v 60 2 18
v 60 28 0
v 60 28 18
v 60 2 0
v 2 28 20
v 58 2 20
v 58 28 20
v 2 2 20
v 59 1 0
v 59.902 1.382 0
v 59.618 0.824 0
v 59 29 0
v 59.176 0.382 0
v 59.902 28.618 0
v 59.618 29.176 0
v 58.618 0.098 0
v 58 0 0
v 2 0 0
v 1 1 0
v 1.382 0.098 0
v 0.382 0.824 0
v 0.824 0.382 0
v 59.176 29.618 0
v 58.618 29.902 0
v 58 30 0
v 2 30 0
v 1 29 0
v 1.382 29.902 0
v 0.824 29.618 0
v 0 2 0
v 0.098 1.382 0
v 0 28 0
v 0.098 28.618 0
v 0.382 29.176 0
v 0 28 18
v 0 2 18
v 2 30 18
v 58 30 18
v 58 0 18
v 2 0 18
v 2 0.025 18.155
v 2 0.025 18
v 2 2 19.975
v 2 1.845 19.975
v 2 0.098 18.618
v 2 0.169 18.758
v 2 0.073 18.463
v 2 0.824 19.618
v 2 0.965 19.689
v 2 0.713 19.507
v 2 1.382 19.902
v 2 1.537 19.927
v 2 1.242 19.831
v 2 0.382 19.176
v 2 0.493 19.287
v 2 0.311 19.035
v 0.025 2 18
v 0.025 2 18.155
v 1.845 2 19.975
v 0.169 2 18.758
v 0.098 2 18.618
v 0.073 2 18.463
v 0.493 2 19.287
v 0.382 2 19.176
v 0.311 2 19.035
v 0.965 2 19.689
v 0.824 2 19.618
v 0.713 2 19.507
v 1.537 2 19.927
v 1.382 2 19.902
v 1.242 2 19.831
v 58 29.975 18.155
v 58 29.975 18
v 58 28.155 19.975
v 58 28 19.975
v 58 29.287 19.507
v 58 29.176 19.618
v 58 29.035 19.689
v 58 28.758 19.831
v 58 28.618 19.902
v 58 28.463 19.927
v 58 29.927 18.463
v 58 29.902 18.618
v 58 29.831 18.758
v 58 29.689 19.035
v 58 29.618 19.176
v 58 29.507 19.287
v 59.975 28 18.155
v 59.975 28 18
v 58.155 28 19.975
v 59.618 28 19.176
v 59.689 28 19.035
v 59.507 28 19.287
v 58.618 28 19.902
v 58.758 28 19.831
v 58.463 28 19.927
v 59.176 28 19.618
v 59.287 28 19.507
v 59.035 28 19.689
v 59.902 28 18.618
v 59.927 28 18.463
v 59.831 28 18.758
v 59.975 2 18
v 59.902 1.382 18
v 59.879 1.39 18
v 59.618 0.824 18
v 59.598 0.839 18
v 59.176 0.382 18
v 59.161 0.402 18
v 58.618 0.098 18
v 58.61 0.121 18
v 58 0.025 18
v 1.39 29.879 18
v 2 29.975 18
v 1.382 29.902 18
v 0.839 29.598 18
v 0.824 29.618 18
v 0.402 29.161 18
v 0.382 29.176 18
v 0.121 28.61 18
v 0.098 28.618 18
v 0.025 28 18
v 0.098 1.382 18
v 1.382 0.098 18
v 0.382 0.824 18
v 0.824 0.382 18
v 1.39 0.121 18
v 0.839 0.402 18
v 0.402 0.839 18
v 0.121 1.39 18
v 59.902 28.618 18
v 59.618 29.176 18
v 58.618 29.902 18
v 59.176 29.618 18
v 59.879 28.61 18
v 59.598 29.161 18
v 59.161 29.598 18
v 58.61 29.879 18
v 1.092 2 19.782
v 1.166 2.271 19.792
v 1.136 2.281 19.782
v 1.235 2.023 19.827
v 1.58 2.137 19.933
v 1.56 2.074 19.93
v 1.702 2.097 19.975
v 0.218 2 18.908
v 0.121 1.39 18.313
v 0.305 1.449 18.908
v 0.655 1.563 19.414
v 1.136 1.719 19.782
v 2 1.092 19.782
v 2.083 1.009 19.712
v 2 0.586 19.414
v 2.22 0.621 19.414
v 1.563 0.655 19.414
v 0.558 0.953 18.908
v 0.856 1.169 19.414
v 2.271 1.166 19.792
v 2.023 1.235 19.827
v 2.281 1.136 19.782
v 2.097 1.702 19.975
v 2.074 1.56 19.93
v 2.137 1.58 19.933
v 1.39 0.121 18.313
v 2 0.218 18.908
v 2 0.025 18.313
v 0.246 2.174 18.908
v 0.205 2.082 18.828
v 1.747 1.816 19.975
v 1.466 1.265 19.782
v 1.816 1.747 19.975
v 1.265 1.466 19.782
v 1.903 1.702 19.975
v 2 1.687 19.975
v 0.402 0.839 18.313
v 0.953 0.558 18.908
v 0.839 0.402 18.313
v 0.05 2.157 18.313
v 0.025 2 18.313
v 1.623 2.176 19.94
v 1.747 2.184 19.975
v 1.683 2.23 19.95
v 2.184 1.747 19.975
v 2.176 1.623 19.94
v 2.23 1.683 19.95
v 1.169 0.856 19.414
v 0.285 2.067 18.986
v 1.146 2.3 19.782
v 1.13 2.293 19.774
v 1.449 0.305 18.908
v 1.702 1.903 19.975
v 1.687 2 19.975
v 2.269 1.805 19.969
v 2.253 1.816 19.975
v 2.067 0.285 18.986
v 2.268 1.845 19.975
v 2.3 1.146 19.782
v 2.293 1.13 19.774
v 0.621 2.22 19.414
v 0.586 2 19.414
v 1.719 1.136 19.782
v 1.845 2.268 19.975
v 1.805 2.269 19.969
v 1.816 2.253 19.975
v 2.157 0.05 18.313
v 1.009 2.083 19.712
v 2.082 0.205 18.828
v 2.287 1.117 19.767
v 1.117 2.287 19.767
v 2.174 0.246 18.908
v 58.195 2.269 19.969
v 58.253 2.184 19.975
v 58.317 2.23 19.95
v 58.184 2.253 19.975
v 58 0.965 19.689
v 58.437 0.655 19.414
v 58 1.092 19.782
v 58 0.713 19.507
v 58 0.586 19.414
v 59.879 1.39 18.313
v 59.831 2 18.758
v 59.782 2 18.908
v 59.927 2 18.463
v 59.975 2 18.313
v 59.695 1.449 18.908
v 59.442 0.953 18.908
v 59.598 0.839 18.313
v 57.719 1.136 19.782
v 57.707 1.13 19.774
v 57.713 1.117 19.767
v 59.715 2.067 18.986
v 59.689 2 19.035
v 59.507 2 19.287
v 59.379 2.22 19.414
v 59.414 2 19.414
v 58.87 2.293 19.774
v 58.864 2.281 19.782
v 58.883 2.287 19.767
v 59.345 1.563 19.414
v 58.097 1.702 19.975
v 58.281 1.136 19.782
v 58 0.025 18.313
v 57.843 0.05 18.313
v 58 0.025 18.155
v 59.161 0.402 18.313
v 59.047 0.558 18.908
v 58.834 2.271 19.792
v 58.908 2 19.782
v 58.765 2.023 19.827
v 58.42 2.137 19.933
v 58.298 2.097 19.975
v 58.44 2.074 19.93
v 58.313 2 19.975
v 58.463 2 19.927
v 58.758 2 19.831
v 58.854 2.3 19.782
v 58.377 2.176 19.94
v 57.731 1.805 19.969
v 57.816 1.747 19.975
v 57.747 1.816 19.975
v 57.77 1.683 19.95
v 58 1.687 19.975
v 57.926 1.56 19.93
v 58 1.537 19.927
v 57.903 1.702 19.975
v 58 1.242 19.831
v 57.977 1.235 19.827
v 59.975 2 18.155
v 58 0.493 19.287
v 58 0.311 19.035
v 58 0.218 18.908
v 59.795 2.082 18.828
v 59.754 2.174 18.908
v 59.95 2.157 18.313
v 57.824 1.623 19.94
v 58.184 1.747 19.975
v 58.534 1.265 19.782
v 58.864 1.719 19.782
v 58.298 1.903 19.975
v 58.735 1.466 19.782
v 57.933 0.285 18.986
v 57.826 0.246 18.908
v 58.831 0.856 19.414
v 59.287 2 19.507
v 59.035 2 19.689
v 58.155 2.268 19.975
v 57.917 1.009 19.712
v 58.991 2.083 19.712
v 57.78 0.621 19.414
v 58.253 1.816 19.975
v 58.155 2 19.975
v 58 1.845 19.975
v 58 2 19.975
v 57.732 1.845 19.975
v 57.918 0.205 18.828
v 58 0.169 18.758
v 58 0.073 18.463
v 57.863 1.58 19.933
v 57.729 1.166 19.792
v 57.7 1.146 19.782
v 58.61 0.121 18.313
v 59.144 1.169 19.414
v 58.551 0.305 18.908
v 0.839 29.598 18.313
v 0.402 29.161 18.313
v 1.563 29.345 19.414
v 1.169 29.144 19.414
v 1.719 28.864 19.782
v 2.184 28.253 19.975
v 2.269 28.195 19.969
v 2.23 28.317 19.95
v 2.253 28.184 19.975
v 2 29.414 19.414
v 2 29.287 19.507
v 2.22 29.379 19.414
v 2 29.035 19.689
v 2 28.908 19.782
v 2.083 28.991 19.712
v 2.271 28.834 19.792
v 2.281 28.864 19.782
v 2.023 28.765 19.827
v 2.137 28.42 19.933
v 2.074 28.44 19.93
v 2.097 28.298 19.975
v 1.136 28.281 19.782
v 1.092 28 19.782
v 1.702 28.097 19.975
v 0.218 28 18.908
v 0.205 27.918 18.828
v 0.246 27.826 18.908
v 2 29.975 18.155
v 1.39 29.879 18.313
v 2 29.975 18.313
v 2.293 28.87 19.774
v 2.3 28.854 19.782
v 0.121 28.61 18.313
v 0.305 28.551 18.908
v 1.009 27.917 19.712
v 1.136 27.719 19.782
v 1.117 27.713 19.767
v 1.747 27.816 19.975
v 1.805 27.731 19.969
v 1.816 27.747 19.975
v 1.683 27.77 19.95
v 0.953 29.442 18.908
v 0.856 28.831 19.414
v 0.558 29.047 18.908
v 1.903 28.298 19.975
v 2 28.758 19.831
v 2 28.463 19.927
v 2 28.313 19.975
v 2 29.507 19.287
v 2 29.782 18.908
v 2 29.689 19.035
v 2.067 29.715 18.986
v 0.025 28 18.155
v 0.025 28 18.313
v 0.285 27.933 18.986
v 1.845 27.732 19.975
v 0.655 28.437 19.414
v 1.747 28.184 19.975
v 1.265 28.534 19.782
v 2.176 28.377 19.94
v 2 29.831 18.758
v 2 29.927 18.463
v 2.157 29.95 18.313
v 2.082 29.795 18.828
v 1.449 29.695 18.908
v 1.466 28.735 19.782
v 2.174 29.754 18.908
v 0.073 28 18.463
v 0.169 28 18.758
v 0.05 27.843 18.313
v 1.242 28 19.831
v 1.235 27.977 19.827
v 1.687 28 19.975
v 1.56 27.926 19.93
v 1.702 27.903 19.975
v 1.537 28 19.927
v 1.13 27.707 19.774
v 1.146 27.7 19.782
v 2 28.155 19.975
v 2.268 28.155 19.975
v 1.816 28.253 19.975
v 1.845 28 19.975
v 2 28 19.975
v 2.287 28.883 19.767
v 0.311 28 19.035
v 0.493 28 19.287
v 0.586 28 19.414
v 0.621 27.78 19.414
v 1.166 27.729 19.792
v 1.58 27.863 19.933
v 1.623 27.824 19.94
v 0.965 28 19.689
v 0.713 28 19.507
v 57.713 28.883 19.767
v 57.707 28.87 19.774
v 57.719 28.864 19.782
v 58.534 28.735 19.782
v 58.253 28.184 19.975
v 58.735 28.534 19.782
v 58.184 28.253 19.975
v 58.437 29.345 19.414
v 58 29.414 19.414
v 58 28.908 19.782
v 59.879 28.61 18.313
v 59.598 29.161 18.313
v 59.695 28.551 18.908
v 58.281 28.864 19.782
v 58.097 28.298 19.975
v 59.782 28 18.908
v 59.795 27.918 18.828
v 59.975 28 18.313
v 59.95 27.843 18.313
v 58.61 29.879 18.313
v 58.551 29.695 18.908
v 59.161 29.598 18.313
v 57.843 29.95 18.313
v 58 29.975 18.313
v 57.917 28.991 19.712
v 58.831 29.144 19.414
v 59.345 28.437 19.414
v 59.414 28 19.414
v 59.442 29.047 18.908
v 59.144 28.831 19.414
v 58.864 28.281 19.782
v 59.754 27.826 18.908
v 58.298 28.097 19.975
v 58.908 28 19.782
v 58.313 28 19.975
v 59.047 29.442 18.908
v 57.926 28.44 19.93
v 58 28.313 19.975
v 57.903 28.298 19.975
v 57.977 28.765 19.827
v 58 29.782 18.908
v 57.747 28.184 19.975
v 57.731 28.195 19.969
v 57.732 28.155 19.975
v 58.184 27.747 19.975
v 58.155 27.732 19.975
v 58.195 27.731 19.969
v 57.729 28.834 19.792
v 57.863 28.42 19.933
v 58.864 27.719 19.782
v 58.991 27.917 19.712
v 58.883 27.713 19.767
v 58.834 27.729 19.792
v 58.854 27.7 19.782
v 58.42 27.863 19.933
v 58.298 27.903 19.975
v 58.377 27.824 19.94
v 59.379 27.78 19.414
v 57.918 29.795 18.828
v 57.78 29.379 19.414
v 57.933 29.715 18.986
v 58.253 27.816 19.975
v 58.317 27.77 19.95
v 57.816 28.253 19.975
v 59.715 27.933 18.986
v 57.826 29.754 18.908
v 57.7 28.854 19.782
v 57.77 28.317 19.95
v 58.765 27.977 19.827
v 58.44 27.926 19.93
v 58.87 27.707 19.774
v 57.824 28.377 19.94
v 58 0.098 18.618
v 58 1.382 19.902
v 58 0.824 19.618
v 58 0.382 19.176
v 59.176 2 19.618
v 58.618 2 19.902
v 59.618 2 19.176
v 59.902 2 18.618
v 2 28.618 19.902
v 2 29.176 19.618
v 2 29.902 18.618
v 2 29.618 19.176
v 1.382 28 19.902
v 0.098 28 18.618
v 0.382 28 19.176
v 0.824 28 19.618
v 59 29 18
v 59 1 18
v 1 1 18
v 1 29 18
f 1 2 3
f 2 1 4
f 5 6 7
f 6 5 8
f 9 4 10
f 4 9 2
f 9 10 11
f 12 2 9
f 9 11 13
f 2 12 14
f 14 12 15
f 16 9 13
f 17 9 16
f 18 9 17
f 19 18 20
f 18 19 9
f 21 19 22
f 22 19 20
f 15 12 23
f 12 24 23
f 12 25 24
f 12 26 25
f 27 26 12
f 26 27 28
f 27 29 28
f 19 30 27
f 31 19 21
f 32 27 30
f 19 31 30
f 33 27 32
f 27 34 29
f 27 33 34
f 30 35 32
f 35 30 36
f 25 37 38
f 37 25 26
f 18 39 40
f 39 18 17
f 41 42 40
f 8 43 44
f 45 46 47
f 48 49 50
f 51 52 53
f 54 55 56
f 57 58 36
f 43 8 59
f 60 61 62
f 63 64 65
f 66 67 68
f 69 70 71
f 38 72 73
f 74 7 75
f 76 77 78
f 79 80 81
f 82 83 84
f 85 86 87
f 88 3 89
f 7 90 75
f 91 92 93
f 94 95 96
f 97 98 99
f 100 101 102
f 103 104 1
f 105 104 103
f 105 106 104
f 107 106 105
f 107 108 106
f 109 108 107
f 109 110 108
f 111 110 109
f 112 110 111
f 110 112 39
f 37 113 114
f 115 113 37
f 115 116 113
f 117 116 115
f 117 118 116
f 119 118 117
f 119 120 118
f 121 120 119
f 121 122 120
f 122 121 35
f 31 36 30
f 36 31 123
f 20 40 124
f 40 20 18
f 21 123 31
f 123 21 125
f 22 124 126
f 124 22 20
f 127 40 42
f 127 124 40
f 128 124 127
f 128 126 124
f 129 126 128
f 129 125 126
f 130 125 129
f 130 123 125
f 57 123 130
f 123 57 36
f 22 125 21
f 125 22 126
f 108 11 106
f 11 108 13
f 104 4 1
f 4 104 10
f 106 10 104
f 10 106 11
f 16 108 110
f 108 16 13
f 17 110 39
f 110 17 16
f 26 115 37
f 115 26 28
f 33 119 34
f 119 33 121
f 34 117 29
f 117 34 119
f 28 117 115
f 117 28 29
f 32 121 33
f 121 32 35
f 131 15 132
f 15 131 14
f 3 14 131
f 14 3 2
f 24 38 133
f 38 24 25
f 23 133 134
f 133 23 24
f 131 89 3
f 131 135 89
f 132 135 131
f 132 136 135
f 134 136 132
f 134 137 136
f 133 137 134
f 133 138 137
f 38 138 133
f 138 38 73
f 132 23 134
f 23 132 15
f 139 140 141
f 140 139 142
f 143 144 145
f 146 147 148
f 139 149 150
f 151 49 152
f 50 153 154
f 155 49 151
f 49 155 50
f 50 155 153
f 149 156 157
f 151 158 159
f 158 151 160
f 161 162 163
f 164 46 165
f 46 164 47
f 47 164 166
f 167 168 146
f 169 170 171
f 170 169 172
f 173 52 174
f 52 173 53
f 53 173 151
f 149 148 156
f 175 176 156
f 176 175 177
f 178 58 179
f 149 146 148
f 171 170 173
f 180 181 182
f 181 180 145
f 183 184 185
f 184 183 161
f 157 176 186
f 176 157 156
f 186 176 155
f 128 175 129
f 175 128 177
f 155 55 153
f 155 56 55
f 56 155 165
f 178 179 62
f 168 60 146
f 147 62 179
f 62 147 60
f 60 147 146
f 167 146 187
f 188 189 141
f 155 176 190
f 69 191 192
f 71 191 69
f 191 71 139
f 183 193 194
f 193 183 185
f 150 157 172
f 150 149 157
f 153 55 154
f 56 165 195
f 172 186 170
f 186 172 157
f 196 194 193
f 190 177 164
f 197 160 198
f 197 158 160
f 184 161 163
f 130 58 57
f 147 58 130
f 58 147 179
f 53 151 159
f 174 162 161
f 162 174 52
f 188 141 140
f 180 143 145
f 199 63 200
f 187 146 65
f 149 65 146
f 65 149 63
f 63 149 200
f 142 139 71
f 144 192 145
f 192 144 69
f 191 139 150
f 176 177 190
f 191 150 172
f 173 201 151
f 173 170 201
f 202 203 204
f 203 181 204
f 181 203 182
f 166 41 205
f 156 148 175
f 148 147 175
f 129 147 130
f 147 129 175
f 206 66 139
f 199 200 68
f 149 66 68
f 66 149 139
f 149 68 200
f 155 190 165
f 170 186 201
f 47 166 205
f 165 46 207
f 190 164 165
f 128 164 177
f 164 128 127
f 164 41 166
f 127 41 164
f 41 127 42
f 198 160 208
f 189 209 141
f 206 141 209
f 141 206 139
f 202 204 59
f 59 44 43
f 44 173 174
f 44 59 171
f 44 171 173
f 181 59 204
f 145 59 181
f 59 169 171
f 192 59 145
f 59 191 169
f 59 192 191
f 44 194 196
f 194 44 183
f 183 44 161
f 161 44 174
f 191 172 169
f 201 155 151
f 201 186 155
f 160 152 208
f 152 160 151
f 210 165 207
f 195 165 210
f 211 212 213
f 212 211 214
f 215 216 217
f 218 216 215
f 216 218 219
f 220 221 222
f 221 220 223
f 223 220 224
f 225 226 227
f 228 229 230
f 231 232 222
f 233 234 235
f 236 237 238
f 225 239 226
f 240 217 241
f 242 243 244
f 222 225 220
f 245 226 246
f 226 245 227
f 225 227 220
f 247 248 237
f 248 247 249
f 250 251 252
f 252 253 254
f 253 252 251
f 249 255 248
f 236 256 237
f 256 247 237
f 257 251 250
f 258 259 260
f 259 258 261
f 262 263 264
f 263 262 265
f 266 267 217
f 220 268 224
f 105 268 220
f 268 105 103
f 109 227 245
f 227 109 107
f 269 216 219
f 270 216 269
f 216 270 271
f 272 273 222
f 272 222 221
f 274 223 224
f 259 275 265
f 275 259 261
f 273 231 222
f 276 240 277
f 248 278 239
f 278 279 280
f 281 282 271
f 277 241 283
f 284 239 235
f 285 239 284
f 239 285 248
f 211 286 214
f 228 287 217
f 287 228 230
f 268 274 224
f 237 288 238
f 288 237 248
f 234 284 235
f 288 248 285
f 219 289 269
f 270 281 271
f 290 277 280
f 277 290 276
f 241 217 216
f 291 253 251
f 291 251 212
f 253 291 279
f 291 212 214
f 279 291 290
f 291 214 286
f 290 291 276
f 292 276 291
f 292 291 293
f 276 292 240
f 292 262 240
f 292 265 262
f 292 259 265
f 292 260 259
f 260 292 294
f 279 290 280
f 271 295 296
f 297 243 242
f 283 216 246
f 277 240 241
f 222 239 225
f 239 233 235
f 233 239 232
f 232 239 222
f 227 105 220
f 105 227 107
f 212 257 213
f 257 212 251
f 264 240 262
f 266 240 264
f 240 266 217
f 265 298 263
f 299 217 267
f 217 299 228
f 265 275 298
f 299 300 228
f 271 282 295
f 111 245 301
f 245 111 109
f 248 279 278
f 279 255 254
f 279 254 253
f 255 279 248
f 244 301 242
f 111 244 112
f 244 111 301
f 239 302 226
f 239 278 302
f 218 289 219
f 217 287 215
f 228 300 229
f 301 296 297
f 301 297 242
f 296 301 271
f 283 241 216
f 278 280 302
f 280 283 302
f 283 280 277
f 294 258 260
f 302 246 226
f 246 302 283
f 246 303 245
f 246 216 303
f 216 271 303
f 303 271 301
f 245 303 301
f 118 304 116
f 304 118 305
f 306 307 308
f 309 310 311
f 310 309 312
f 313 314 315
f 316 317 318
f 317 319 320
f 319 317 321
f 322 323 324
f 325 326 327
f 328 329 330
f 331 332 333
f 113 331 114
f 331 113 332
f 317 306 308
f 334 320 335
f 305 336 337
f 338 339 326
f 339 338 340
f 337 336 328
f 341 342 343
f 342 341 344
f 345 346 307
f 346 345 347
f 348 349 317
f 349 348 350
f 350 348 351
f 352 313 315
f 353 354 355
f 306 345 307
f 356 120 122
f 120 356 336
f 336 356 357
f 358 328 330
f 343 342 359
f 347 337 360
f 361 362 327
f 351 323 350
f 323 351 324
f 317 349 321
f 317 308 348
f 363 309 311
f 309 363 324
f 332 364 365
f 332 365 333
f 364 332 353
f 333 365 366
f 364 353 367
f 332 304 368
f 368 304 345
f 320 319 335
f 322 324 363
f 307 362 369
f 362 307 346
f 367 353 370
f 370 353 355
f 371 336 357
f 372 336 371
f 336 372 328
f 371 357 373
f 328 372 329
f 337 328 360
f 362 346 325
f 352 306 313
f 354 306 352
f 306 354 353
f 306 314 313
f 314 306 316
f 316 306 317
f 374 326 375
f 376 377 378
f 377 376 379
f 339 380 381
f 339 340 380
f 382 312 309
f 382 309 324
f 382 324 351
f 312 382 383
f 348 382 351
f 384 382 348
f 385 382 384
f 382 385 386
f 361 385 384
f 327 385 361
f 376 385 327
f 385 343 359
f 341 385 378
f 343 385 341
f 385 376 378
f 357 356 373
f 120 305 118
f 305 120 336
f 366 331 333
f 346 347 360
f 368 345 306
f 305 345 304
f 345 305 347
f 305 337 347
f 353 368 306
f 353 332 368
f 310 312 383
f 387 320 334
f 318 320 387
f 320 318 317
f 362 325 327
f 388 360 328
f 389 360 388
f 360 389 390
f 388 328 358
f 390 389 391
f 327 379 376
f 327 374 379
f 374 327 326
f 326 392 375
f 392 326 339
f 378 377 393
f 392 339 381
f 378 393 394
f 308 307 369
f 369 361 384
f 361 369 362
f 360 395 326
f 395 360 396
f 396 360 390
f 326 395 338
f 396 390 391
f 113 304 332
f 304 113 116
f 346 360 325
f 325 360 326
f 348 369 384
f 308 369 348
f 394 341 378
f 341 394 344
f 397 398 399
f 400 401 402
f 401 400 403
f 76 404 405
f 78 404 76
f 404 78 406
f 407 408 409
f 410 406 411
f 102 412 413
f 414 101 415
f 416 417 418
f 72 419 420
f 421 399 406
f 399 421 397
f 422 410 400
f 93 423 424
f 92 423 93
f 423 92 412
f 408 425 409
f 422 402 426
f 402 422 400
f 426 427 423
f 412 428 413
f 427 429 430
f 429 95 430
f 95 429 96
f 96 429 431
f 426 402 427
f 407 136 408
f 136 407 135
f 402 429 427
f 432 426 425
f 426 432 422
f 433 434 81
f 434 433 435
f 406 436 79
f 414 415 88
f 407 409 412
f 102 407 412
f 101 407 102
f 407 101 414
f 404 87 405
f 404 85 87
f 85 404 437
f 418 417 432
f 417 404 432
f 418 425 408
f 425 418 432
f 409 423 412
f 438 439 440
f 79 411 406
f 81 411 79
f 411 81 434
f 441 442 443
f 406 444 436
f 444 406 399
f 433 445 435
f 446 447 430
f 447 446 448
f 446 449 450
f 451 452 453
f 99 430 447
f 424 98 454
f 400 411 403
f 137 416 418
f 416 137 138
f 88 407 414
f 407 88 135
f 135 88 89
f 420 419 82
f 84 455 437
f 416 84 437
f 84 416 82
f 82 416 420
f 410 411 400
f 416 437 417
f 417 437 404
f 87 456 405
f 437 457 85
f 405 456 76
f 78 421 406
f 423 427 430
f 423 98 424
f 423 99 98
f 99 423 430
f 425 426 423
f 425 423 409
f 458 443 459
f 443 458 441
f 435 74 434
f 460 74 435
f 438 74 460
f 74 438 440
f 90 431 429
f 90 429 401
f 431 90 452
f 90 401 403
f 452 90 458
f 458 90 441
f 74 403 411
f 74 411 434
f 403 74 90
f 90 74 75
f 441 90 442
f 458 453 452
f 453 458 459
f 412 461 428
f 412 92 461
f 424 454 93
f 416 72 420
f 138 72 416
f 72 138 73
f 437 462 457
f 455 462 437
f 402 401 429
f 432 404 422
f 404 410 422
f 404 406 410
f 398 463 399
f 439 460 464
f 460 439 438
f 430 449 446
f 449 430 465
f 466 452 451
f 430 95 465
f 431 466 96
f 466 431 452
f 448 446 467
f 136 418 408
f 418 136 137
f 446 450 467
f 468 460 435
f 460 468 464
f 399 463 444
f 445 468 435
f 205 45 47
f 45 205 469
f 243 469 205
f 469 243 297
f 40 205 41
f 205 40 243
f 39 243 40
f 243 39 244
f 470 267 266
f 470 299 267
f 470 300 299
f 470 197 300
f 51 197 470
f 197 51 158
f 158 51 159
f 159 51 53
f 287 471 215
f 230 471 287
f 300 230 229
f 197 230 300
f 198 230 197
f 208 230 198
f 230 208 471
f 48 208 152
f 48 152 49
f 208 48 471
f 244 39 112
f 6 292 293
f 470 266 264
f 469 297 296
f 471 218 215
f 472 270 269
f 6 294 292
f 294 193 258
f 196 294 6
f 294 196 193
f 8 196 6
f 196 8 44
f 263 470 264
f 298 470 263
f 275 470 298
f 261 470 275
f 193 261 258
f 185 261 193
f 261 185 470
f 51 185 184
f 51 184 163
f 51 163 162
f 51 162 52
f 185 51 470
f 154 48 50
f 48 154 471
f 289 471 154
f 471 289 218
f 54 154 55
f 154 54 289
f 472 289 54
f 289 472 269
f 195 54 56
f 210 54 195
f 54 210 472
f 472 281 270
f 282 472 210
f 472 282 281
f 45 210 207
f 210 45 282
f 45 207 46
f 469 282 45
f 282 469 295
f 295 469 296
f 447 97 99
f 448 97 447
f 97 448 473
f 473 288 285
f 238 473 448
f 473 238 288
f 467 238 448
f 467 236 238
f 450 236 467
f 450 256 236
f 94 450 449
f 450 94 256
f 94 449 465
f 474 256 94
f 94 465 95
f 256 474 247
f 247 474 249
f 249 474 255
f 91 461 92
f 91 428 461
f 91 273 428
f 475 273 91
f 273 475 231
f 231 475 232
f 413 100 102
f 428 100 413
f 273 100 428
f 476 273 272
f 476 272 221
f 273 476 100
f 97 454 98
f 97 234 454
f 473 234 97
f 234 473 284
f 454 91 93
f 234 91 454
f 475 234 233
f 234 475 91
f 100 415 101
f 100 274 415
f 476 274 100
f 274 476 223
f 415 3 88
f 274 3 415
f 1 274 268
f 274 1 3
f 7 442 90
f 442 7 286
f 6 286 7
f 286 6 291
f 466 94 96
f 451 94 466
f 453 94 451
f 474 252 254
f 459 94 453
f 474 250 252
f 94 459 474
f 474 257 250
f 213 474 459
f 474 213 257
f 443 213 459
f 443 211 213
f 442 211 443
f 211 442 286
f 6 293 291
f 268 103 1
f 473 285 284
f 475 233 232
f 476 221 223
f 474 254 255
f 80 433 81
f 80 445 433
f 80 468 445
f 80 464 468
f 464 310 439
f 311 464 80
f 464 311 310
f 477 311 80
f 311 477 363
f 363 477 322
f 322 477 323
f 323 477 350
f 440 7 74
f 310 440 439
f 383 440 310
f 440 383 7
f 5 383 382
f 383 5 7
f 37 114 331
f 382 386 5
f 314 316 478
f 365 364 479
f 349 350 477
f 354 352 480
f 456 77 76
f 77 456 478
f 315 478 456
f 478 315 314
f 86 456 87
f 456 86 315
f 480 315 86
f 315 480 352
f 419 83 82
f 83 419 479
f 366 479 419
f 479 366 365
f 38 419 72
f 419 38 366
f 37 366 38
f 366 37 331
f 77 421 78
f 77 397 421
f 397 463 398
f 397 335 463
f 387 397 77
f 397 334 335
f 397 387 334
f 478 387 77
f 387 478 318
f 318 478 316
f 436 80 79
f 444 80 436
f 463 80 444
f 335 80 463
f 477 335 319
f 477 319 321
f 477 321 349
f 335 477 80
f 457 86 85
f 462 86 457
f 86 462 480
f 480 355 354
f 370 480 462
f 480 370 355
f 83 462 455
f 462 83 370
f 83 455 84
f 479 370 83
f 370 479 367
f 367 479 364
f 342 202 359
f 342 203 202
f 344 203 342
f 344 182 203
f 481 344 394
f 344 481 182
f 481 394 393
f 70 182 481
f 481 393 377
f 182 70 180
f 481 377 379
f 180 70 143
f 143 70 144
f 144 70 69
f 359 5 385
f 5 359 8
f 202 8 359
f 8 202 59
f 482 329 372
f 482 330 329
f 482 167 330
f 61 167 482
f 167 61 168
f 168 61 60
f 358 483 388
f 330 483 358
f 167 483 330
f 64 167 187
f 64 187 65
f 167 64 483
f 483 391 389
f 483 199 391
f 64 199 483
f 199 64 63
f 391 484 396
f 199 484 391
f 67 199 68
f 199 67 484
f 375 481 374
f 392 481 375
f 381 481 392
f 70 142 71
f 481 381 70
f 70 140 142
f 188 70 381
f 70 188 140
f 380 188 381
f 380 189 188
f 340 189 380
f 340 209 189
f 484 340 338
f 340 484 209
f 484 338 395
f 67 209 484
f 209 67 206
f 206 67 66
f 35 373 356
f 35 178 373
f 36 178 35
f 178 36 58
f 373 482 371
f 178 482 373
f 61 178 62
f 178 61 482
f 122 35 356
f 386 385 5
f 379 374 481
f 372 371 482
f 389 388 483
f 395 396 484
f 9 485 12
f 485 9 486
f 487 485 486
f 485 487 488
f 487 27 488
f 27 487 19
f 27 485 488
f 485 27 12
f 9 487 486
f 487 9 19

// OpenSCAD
// this project is a printable cover for guitar pickups

coverLength = 60;
coverWidth = 30;
coverHeight = 20;
coverThickness = 1; // this is the thickness of each side
roundness = 2; // this is degree of roundness the corners get

faces = 20;

edge = roundness*coverThickness;

module coverBase(){

  // draw the shape out, cut the corners, cut screw holes
  difference(){
      cube([coverLength, coverWidth, coverHeight]);

      // this cuts the corner edges around the sides
      cube([edge, edge, coverHeight]);
      translate([coverLength - edge, 0, 0])
        cube([edge, edge, coverHeight]);
      translate([coverLength - edge, coverWidth - edge, 0])
        cube([edge, edge, coverHeight]);
      translate([0, coverWidth - edge, 0])
        cube([edge, edge,coverHeight]);
      /*screwTapping(); // screws are cut before the corners are filled back in*/

      // this cuts the corner edges around the top
      translate([0, 0, coverHeight - edge])
        cube([coverLength, edge, edge]);
      translate([0, coverWidth - edge, coverHeight - edge])
        cube([coverLength, edge, edge]);
      translate([0, 0, coverHeight - edge])
        cube([edge, coverWidth, edge]);
      translate([coverLength - edge, 0, coverHeight - edge])
        cube([edge, coverWidth, edge]);
    }

    // replace the cut side corners with rounded edges
    translate([edge, edge, 0])
      cylinder(r = edge, coverHeight - edge, $fn = faces);
    translate([coverLength - edge, edge, 0])
      cylinder(r = edge, coverHeight - edge, $fn = faces);
    translate([edge, coverWidth-edge, 0])
      cylinder(r = edge, coverHeight - edge, $fn = faces);
    translate([coverLength - edge, coverWidth - edge, 0])
      cylinder(r = edge, coverHeight - edge, $fn = faces);

    // replace the cut top corners with rounded edges
    translate([edge, edge, coverHeight - edge])
      sphere(r = edge, $fn = faces);
    translate([coverLength - edge, edge, coverHeight - edge])
      sphere(r = edge, $fn = faces);
    translate([edge, coverWidth-edge, coverHeight - edge])
      sphere(r = edge, $fn = faces);
    translate([coverLength - edge, coverWidth - edge, coverHeight - edge])
      sphere(r = edge, $fn = faces);

    // this lays the long curved edges, starts with origin going CCW
    translate([edge, edge, coverHeight - edge])
    rotate([0,90,0])
      cylinder(r = edge, coverLength - 2*edge, $fn = faces);
    translate([coverLength - edge, edge, coverHeight - edge])
    rotate([270,0,0])
      cylinder(r = edge, coverWidth - 2*edge, $fn = faces);
    translate([coverLength - edge, coverWidth - edge, coverHeight - edge])
    rotate([0,270,0])
      cylinder(r = edge, coverLength - 2*edge, $fn = faces);
    translate([edge, coverWidth-edge, coverHeight - edge])
    rotate([90,0,0])
      cylinder(r = edge, coverWidth - 2*edge, $fn = faces);

}

module mainBodyCut(){

  // cuts the interior open
  translate([coverThickness, coverThickness, 0])
    cube([coverLength - 2*coverThickness, coverWidth - 2*coverThickness, coverHeight - 2*coverThickness]);
}

difference(){
  coverBase();
  mainBodyCut();
}
